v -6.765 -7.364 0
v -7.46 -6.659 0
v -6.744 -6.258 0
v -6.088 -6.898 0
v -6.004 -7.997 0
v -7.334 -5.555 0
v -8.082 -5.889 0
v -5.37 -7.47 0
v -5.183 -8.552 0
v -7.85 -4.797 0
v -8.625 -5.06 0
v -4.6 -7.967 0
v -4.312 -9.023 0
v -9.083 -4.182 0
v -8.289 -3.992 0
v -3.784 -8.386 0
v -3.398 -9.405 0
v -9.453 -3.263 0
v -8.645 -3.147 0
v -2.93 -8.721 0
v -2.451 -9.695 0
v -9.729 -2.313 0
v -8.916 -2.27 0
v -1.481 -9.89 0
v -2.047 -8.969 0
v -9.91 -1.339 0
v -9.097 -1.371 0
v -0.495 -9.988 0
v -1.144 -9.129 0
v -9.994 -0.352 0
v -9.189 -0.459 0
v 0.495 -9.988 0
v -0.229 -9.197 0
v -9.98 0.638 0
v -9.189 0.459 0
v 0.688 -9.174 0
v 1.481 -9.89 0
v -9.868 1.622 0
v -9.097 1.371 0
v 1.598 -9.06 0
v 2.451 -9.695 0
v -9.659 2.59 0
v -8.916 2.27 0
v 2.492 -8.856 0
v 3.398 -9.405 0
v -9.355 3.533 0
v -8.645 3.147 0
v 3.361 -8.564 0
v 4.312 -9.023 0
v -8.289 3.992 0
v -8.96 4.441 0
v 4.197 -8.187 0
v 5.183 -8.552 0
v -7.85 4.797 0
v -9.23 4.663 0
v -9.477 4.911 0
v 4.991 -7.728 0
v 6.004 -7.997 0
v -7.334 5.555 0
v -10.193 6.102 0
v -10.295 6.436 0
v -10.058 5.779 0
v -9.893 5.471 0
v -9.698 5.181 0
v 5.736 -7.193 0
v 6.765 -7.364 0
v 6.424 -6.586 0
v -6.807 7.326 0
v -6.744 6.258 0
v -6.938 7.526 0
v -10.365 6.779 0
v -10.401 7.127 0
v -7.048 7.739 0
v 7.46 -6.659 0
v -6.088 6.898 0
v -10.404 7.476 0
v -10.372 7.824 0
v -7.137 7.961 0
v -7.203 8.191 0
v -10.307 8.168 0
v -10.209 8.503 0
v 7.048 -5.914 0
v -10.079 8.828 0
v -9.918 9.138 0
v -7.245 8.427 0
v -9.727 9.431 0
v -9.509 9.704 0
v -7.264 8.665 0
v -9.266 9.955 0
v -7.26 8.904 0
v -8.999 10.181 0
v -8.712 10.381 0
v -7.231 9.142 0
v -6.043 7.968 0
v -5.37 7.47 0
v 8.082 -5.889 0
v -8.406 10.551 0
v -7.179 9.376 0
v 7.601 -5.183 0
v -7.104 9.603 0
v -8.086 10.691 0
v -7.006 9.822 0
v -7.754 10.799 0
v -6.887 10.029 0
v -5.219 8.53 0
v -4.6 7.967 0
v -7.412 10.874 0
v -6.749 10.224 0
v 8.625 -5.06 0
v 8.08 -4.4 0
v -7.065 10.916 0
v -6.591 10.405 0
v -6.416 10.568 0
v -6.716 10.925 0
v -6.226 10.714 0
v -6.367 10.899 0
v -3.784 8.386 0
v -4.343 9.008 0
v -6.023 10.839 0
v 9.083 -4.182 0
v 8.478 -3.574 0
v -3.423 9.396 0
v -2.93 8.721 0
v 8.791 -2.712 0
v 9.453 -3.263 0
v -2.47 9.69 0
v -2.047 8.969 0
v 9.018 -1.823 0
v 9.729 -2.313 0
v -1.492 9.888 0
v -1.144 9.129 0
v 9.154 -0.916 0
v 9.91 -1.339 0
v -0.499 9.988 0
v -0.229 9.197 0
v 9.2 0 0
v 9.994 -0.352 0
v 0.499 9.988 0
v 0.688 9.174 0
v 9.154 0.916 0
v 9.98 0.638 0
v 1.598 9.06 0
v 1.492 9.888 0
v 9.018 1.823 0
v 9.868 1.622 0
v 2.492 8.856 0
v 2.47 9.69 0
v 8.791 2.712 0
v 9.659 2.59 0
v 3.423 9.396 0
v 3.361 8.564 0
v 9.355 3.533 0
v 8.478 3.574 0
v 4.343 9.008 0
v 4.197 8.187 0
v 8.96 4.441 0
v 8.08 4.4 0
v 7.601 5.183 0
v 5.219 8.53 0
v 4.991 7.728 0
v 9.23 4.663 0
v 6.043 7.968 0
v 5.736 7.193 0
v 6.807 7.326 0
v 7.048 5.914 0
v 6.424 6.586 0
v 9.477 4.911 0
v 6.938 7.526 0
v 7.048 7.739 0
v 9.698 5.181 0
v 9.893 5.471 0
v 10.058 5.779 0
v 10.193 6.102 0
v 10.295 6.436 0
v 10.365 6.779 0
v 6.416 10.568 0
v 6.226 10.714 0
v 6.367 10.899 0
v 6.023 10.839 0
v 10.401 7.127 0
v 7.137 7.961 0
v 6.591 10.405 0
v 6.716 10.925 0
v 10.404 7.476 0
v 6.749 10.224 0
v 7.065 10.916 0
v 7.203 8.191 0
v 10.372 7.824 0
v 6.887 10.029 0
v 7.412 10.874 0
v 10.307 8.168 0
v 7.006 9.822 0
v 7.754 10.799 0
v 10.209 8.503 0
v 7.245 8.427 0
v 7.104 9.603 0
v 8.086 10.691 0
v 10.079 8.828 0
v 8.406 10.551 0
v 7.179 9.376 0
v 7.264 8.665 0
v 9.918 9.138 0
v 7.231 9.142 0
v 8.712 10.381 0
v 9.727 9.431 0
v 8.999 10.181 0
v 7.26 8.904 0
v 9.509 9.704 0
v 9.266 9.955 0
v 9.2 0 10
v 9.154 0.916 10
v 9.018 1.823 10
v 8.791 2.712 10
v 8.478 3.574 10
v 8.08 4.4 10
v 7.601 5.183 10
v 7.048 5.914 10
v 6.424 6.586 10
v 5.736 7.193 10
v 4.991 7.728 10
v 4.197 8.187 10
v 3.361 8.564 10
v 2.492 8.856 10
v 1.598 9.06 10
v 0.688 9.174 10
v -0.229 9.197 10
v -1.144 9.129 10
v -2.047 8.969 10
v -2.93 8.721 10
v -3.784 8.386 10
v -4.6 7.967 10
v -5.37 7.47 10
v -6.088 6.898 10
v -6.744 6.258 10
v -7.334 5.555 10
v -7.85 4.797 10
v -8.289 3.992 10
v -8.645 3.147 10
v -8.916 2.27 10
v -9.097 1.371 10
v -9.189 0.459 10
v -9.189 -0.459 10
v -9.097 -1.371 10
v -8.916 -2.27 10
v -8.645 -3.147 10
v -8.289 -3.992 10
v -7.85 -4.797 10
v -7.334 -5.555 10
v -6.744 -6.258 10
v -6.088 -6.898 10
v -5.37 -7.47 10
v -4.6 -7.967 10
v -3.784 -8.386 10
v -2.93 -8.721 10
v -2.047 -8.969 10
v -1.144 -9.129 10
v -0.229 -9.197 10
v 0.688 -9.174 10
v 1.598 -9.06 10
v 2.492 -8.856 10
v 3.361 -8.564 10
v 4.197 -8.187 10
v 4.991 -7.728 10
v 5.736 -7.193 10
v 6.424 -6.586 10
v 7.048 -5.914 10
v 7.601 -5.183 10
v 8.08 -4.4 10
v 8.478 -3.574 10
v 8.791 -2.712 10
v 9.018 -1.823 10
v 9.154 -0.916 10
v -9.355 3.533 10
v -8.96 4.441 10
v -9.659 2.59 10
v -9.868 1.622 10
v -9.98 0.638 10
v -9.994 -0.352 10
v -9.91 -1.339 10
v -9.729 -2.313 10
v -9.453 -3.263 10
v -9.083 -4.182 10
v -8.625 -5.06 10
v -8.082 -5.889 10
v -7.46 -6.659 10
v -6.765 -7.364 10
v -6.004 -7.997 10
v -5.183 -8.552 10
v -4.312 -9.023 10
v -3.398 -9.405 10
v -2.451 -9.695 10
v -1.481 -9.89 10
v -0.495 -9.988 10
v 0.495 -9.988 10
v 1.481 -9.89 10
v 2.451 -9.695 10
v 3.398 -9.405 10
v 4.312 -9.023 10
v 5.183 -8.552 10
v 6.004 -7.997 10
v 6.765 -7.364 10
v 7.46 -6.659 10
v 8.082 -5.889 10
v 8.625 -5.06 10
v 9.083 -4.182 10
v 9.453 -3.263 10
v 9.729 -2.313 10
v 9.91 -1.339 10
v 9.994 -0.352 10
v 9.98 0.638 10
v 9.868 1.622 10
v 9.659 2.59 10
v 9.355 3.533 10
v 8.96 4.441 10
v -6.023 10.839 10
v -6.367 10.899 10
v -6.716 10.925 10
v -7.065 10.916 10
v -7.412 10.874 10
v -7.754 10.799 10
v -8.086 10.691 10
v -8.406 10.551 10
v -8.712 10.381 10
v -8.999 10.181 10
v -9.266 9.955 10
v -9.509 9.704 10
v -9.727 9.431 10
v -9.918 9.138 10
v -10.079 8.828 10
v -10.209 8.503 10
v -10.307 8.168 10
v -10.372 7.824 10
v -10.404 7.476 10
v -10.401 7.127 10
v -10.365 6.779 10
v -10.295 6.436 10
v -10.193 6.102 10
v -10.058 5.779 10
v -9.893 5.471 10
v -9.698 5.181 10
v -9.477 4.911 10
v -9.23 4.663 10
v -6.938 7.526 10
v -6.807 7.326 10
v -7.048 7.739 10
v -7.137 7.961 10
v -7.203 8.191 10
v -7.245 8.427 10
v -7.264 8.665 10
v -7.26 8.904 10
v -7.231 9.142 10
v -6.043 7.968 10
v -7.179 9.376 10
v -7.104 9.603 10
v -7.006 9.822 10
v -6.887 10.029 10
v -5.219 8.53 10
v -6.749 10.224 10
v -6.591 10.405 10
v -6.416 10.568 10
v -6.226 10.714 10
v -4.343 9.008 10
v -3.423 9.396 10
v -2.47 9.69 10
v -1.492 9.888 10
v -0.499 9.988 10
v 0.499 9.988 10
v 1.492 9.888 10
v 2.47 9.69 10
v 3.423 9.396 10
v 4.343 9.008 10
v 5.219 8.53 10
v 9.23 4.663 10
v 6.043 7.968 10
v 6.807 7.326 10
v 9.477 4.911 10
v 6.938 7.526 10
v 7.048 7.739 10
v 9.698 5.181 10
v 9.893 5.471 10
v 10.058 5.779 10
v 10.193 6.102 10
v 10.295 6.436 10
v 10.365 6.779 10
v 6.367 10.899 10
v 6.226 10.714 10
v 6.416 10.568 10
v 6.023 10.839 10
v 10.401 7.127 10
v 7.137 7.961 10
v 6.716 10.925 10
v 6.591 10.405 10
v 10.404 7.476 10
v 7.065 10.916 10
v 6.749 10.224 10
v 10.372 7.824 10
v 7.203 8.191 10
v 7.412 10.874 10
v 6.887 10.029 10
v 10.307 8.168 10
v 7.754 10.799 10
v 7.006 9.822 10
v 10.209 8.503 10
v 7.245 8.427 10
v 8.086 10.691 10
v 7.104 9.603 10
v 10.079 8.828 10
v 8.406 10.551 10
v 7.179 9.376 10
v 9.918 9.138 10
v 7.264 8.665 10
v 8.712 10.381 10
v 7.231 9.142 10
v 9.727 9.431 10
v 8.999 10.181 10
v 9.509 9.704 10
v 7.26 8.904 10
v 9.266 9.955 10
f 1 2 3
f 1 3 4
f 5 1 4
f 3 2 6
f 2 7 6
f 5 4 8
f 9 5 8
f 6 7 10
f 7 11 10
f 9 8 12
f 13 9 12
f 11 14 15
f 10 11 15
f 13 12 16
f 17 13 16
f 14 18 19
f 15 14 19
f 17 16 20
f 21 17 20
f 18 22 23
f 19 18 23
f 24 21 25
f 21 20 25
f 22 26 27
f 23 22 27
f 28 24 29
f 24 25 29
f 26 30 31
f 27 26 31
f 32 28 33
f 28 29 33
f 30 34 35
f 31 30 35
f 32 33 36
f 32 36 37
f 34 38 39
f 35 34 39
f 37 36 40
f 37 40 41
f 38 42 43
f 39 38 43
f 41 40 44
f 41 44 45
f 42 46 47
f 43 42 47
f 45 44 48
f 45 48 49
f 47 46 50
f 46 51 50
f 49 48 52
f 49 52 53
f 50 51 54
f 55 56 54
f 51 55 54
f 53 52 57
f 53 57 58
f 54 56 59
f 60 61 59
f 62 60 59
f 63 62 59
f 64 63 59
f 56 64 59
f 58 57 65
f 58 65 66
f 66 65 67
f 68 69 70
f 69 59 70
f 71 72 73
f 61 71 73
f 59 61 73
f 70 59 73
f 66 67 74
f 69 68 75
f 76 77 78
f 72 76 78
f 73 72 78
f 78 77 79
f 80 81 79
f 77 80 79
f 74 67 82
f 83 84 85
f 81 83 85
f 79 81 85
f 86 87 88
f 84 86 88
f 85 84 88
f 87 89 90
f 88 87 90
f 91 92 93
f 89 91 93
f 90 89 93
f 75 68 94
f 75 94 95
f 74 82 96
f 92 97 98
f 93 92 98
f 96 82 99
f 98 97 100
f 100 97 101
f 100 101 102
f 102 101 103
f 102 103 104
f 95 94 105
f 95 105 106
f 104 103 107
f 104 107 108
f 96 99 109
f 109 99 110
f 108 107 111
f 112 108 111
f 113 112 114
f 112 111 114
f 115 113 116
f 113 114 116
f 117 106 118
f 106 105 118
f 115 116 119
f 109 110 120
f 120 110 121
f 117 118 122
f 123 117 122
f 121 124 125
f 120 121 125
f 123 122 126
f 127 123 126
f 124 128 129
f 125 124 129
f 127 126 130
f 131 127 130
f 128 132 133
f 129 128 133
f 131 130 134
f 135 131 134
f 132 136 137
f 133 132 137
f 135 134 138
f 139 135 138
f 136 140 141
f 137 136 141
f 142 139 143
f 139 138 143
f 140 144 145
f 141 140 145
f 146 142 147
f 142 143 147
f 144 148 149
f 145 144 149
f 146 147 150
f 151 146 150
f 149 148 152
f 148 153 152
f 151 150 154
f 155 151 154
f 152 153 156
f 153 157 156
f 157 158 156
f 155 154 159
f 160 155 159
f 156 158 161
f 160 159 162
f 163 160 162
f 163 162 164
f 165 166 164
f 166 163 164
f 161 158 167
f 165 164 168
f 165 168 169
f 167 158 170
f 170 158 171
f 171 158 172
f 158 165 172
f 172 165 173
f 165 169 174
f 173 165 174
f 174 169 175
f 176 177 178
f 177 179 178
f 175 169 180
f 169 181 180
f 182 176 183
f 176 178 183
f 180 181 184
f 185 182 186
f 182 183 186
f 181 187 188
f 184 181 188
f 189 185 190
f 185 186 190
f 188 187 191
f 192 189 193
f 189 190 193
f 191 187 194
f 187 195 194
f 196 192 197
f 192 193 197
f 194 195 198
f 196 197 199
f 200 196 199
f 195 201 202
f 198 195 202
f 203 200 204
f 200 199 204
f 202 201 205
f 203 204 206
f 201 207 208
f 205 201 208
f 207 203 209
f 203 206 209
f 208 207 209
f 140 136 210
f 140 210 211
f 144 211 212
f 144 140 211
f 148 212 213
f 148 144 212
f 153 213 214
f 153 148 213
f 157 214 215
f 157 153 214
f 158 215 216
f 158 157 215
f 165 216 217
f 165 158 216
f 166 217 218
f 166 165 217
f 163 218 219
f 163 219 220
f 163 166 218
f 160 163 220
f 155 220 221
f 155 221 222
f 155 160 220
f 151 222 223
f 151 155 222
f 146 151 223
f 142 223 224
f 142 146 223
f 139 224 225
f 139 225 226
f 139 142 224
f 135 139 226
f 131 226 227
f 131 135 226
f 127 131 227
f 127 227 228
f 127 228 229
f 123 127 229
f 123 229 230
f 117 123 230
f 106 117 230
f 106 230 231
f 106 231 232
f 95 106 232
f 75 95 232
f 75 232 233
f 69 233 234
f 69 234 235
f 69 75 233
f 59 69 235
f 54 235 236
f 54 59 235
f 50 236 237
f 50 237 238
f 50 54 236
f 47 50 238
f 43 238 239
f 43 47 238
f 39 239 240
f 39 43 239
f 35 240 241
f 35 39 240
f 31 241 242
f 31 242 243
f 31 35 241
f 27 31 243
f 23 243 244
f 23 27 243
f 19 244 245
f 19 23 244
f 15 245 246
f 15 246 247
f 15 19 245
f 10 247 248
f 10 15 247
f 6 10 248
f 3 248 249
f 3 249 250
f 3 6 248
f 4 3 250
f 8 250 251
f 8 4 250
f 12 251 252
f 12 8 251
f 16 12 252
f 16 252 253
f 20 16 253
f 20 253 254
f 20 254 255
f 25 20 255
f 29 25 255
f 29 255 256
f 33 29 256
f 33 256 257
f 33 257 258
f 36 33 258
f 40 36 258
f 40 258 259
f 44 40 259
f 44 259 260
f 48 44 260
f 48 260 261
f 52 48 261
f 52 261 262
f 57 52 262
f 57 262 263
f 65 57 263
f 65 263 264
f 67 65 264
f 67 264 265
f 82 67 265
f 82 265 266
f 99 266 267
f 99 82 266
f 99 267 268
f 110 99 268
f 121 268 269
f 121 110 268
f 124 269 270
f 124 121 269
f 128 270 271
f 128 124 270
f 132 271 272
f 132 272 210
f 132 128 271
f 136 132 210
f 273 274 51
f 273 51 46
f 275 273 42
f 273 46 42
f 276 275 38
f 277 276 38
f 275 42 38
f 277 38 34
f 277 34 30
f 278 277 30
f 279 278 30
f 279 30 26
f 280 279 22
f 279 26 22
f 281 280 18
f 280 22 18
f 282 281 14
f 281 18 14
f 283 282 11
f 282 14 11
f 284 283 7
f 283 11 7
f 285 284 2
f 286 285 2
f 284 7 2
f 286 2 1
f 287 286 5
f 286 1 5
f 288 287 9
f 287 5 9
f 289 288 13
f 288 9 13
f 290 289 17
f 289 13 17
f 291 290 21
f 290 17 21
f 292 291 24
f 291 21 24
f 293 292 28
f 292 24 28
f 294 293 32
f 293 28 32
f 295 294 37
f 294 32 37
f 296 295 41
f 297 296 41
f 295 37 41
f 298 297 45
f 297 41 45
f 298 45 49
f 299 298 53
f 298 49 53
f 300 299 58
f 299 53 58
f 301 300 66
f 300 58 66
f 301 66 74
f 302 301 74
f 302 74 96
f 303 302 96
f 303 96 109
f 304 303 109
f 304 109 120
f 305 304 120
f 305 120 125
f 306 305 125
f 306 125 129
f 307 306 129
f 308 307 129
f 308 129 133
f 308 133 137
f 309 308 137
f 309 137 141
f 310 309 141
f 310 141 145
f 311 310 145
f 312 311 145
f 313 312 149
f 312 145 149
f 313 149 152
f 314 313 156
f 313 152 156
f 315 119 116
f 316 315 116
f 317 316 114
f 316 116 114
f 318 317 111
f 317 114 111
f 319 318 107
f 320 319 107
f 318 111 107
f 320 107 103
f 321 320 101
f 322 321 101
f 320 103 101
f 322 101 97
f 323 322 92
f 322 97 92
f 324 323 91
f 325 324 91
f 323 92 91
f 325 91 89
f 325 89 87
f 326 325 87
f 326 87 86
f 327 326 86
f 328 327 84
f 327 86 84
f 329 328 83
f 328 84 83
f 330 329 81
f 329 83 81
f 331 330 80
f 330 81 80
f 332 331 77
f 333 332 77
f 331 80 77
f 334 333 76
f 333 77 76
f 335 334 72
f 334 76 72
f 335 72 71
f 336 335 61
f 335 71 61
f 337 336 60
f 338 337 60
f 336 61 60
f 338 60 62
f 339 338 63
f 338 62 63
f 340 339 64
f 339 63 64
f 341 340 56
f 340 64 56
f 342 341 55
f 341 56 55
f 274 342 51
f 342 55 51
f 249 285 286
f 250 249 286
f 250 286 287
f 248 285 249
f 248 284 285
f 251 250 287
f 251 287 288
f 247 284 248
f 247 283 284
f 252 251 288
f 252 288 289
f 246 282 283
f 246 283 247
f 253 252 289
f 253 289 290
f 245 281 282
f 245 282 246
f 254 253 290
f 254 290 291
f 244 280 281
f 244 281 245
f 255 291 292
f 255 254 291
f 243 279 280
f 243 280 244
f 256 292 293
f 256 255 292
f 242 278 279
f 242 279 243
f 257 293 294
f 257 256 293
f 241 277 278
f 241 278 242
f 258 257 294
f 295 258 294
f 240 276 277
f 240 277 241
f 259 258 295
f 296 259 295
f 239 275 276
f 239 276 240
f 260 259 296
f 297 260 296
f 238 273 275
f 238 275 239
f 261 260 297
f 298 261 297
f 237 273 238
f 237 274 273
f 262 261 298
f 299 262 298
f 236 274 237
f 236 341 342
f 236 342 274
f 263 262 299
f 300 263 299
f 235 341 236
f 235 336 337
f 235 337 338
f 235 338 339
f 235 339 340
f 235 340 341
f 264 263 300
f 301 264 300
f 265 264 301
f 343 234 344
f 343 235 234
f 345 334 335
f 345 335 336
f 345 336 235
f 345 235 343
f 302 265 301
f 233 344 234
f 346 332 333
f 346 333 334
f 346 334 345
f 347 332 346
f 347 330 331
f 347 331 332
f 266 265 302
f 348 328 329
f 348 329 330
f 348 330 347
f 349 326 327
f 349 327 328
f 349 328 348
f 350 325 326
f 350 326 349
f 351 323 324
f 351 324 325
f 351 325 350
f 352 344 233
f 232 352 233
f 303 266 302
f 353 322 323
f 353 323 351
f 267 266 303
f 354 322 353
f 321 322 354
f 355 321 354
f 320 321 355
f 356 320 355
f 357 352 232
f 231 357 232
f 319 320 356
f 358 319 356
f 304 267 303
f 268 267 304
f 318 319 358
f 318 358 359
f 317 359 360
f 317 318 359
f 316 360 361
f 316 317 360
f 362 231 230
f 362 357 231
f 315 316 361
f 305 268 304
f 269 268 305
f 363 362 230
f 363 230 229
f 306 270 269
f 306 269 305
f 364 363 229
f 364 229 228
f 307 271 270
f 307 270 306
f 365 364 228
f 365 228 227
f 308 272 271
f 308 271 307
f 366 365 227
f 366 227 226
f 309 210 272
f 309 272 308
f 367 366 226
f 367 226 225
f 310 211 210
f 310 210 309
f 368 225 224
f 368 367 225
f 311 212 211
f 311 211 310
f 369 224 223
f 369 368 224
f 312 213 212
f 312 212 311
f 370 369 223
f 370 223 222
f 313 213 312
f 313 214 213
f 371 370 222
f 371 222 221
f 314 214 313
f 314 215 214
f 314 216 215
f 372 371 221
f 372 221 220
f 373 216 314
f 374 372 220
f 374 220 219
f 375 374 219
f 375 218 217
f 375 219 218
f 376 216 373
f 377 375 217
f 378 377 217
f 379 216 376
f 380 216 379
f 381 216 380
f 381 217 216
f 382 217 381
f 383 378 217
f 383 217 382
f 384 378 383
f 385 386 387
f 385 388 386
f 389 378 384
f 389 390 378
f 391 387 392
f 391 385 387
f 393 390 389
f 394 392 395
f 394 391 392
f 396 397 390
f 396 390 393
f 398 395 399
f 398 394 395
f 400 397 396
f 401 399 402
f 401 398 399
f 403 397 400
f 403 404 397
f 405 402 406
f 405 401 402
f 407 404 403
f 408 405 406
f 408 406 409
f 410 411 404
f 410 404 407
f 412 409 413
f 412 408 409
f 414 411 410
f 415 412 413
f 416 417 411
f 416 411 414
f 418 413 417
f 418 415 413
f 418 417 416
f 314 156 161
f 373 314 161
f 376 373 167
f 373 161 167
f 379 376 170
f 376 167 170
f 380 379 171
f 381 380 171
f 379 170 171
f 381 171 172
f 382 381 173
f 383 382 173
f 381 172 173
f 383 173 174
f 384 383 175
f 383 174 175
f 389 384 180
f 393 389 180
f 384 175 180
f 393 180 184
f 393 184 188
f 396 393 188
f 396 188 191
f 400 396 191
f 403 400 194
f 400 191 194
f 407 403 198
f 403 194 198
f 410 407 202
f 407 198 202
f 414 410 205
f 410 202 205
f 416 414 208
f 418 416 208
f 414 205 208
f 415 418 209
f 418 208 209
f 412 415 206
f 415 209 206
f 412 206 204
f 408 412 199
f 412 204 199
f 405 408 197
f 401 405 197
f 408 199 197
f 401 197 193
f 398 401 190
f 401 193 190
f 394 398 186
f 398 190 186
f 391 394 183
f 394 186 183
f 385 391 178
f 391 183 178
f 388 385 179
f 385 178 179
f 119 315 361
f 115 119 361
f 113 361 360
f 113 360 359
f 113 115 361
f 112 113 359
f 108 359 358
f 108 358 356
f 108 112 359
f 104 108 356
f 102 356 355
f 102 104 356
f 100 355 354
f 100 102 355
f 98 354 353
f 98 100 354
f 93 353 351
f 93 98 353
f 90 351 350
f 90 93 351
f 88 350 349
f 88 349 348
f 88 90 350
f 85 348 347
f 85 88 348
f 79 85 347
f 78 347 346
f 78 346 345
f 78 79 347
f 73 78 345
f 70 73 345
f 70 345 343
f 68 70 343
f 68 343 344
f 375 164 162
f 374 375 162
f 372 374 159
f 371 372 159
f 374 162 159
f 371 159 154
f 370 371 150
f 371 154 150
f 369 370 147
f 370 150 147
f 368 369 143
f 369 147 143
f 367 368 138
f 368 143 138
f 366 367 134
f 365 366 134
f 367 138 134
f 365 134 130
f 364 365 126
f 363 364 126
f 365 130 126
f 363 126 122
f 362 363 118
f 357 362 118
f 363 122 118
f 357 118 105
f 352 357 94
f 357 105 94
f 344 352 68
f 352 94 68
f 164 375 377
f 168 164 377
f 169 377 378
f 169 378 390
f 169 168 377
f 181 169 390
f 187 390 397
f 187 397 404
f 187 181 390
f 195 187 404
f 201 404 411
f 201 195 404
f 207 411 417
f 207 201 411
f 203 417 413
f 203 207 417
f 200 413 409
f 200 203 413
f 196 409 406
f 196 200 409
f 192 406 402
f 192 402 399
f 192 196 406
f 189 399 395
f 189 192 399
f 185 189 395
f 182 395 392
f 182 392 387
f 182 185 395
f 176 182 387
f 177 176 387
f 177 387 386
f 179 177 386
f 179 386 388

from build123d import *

# Parameters (mm, degrees)
SKETCH_R      = 9.2
EXTRUDE_DEPTH = 10


with BuildPart() as part:
    # Sketch → Extrude (new body)
    with BuildSketch(Plane.XY):
        with BuildLine():
            ThreePointArc((-6.022522, 10.839217), (-10.07862, 8.827673), (-8.96, 4.440541))
            ThreePointArc((-8.96, 4.440541), (0, -10), (8.96, 4.440541))
            ThreePointArc((8.96, 4.440541), (10.07862, 8.827673), (6.022522, 10.839217))
            ThreePointArc((6.806908, 7.325709), (7.207742, 9.259505), (6.022522, 10.839217))
            ThreePointArc((6.806908, 7.325709), (0, 10), (-6.806908, 7.325709))
            ThreePointArc((-6.022522, 10.839217), (-7.207742, 9.259505), (-6.806908, 7.325709))
        make_face()
        Circle(SKETCH_R, mode=Mode.SUBTRACT)
    extrude(amount=EXTRUDE_DEPTH)


solid = part.part
